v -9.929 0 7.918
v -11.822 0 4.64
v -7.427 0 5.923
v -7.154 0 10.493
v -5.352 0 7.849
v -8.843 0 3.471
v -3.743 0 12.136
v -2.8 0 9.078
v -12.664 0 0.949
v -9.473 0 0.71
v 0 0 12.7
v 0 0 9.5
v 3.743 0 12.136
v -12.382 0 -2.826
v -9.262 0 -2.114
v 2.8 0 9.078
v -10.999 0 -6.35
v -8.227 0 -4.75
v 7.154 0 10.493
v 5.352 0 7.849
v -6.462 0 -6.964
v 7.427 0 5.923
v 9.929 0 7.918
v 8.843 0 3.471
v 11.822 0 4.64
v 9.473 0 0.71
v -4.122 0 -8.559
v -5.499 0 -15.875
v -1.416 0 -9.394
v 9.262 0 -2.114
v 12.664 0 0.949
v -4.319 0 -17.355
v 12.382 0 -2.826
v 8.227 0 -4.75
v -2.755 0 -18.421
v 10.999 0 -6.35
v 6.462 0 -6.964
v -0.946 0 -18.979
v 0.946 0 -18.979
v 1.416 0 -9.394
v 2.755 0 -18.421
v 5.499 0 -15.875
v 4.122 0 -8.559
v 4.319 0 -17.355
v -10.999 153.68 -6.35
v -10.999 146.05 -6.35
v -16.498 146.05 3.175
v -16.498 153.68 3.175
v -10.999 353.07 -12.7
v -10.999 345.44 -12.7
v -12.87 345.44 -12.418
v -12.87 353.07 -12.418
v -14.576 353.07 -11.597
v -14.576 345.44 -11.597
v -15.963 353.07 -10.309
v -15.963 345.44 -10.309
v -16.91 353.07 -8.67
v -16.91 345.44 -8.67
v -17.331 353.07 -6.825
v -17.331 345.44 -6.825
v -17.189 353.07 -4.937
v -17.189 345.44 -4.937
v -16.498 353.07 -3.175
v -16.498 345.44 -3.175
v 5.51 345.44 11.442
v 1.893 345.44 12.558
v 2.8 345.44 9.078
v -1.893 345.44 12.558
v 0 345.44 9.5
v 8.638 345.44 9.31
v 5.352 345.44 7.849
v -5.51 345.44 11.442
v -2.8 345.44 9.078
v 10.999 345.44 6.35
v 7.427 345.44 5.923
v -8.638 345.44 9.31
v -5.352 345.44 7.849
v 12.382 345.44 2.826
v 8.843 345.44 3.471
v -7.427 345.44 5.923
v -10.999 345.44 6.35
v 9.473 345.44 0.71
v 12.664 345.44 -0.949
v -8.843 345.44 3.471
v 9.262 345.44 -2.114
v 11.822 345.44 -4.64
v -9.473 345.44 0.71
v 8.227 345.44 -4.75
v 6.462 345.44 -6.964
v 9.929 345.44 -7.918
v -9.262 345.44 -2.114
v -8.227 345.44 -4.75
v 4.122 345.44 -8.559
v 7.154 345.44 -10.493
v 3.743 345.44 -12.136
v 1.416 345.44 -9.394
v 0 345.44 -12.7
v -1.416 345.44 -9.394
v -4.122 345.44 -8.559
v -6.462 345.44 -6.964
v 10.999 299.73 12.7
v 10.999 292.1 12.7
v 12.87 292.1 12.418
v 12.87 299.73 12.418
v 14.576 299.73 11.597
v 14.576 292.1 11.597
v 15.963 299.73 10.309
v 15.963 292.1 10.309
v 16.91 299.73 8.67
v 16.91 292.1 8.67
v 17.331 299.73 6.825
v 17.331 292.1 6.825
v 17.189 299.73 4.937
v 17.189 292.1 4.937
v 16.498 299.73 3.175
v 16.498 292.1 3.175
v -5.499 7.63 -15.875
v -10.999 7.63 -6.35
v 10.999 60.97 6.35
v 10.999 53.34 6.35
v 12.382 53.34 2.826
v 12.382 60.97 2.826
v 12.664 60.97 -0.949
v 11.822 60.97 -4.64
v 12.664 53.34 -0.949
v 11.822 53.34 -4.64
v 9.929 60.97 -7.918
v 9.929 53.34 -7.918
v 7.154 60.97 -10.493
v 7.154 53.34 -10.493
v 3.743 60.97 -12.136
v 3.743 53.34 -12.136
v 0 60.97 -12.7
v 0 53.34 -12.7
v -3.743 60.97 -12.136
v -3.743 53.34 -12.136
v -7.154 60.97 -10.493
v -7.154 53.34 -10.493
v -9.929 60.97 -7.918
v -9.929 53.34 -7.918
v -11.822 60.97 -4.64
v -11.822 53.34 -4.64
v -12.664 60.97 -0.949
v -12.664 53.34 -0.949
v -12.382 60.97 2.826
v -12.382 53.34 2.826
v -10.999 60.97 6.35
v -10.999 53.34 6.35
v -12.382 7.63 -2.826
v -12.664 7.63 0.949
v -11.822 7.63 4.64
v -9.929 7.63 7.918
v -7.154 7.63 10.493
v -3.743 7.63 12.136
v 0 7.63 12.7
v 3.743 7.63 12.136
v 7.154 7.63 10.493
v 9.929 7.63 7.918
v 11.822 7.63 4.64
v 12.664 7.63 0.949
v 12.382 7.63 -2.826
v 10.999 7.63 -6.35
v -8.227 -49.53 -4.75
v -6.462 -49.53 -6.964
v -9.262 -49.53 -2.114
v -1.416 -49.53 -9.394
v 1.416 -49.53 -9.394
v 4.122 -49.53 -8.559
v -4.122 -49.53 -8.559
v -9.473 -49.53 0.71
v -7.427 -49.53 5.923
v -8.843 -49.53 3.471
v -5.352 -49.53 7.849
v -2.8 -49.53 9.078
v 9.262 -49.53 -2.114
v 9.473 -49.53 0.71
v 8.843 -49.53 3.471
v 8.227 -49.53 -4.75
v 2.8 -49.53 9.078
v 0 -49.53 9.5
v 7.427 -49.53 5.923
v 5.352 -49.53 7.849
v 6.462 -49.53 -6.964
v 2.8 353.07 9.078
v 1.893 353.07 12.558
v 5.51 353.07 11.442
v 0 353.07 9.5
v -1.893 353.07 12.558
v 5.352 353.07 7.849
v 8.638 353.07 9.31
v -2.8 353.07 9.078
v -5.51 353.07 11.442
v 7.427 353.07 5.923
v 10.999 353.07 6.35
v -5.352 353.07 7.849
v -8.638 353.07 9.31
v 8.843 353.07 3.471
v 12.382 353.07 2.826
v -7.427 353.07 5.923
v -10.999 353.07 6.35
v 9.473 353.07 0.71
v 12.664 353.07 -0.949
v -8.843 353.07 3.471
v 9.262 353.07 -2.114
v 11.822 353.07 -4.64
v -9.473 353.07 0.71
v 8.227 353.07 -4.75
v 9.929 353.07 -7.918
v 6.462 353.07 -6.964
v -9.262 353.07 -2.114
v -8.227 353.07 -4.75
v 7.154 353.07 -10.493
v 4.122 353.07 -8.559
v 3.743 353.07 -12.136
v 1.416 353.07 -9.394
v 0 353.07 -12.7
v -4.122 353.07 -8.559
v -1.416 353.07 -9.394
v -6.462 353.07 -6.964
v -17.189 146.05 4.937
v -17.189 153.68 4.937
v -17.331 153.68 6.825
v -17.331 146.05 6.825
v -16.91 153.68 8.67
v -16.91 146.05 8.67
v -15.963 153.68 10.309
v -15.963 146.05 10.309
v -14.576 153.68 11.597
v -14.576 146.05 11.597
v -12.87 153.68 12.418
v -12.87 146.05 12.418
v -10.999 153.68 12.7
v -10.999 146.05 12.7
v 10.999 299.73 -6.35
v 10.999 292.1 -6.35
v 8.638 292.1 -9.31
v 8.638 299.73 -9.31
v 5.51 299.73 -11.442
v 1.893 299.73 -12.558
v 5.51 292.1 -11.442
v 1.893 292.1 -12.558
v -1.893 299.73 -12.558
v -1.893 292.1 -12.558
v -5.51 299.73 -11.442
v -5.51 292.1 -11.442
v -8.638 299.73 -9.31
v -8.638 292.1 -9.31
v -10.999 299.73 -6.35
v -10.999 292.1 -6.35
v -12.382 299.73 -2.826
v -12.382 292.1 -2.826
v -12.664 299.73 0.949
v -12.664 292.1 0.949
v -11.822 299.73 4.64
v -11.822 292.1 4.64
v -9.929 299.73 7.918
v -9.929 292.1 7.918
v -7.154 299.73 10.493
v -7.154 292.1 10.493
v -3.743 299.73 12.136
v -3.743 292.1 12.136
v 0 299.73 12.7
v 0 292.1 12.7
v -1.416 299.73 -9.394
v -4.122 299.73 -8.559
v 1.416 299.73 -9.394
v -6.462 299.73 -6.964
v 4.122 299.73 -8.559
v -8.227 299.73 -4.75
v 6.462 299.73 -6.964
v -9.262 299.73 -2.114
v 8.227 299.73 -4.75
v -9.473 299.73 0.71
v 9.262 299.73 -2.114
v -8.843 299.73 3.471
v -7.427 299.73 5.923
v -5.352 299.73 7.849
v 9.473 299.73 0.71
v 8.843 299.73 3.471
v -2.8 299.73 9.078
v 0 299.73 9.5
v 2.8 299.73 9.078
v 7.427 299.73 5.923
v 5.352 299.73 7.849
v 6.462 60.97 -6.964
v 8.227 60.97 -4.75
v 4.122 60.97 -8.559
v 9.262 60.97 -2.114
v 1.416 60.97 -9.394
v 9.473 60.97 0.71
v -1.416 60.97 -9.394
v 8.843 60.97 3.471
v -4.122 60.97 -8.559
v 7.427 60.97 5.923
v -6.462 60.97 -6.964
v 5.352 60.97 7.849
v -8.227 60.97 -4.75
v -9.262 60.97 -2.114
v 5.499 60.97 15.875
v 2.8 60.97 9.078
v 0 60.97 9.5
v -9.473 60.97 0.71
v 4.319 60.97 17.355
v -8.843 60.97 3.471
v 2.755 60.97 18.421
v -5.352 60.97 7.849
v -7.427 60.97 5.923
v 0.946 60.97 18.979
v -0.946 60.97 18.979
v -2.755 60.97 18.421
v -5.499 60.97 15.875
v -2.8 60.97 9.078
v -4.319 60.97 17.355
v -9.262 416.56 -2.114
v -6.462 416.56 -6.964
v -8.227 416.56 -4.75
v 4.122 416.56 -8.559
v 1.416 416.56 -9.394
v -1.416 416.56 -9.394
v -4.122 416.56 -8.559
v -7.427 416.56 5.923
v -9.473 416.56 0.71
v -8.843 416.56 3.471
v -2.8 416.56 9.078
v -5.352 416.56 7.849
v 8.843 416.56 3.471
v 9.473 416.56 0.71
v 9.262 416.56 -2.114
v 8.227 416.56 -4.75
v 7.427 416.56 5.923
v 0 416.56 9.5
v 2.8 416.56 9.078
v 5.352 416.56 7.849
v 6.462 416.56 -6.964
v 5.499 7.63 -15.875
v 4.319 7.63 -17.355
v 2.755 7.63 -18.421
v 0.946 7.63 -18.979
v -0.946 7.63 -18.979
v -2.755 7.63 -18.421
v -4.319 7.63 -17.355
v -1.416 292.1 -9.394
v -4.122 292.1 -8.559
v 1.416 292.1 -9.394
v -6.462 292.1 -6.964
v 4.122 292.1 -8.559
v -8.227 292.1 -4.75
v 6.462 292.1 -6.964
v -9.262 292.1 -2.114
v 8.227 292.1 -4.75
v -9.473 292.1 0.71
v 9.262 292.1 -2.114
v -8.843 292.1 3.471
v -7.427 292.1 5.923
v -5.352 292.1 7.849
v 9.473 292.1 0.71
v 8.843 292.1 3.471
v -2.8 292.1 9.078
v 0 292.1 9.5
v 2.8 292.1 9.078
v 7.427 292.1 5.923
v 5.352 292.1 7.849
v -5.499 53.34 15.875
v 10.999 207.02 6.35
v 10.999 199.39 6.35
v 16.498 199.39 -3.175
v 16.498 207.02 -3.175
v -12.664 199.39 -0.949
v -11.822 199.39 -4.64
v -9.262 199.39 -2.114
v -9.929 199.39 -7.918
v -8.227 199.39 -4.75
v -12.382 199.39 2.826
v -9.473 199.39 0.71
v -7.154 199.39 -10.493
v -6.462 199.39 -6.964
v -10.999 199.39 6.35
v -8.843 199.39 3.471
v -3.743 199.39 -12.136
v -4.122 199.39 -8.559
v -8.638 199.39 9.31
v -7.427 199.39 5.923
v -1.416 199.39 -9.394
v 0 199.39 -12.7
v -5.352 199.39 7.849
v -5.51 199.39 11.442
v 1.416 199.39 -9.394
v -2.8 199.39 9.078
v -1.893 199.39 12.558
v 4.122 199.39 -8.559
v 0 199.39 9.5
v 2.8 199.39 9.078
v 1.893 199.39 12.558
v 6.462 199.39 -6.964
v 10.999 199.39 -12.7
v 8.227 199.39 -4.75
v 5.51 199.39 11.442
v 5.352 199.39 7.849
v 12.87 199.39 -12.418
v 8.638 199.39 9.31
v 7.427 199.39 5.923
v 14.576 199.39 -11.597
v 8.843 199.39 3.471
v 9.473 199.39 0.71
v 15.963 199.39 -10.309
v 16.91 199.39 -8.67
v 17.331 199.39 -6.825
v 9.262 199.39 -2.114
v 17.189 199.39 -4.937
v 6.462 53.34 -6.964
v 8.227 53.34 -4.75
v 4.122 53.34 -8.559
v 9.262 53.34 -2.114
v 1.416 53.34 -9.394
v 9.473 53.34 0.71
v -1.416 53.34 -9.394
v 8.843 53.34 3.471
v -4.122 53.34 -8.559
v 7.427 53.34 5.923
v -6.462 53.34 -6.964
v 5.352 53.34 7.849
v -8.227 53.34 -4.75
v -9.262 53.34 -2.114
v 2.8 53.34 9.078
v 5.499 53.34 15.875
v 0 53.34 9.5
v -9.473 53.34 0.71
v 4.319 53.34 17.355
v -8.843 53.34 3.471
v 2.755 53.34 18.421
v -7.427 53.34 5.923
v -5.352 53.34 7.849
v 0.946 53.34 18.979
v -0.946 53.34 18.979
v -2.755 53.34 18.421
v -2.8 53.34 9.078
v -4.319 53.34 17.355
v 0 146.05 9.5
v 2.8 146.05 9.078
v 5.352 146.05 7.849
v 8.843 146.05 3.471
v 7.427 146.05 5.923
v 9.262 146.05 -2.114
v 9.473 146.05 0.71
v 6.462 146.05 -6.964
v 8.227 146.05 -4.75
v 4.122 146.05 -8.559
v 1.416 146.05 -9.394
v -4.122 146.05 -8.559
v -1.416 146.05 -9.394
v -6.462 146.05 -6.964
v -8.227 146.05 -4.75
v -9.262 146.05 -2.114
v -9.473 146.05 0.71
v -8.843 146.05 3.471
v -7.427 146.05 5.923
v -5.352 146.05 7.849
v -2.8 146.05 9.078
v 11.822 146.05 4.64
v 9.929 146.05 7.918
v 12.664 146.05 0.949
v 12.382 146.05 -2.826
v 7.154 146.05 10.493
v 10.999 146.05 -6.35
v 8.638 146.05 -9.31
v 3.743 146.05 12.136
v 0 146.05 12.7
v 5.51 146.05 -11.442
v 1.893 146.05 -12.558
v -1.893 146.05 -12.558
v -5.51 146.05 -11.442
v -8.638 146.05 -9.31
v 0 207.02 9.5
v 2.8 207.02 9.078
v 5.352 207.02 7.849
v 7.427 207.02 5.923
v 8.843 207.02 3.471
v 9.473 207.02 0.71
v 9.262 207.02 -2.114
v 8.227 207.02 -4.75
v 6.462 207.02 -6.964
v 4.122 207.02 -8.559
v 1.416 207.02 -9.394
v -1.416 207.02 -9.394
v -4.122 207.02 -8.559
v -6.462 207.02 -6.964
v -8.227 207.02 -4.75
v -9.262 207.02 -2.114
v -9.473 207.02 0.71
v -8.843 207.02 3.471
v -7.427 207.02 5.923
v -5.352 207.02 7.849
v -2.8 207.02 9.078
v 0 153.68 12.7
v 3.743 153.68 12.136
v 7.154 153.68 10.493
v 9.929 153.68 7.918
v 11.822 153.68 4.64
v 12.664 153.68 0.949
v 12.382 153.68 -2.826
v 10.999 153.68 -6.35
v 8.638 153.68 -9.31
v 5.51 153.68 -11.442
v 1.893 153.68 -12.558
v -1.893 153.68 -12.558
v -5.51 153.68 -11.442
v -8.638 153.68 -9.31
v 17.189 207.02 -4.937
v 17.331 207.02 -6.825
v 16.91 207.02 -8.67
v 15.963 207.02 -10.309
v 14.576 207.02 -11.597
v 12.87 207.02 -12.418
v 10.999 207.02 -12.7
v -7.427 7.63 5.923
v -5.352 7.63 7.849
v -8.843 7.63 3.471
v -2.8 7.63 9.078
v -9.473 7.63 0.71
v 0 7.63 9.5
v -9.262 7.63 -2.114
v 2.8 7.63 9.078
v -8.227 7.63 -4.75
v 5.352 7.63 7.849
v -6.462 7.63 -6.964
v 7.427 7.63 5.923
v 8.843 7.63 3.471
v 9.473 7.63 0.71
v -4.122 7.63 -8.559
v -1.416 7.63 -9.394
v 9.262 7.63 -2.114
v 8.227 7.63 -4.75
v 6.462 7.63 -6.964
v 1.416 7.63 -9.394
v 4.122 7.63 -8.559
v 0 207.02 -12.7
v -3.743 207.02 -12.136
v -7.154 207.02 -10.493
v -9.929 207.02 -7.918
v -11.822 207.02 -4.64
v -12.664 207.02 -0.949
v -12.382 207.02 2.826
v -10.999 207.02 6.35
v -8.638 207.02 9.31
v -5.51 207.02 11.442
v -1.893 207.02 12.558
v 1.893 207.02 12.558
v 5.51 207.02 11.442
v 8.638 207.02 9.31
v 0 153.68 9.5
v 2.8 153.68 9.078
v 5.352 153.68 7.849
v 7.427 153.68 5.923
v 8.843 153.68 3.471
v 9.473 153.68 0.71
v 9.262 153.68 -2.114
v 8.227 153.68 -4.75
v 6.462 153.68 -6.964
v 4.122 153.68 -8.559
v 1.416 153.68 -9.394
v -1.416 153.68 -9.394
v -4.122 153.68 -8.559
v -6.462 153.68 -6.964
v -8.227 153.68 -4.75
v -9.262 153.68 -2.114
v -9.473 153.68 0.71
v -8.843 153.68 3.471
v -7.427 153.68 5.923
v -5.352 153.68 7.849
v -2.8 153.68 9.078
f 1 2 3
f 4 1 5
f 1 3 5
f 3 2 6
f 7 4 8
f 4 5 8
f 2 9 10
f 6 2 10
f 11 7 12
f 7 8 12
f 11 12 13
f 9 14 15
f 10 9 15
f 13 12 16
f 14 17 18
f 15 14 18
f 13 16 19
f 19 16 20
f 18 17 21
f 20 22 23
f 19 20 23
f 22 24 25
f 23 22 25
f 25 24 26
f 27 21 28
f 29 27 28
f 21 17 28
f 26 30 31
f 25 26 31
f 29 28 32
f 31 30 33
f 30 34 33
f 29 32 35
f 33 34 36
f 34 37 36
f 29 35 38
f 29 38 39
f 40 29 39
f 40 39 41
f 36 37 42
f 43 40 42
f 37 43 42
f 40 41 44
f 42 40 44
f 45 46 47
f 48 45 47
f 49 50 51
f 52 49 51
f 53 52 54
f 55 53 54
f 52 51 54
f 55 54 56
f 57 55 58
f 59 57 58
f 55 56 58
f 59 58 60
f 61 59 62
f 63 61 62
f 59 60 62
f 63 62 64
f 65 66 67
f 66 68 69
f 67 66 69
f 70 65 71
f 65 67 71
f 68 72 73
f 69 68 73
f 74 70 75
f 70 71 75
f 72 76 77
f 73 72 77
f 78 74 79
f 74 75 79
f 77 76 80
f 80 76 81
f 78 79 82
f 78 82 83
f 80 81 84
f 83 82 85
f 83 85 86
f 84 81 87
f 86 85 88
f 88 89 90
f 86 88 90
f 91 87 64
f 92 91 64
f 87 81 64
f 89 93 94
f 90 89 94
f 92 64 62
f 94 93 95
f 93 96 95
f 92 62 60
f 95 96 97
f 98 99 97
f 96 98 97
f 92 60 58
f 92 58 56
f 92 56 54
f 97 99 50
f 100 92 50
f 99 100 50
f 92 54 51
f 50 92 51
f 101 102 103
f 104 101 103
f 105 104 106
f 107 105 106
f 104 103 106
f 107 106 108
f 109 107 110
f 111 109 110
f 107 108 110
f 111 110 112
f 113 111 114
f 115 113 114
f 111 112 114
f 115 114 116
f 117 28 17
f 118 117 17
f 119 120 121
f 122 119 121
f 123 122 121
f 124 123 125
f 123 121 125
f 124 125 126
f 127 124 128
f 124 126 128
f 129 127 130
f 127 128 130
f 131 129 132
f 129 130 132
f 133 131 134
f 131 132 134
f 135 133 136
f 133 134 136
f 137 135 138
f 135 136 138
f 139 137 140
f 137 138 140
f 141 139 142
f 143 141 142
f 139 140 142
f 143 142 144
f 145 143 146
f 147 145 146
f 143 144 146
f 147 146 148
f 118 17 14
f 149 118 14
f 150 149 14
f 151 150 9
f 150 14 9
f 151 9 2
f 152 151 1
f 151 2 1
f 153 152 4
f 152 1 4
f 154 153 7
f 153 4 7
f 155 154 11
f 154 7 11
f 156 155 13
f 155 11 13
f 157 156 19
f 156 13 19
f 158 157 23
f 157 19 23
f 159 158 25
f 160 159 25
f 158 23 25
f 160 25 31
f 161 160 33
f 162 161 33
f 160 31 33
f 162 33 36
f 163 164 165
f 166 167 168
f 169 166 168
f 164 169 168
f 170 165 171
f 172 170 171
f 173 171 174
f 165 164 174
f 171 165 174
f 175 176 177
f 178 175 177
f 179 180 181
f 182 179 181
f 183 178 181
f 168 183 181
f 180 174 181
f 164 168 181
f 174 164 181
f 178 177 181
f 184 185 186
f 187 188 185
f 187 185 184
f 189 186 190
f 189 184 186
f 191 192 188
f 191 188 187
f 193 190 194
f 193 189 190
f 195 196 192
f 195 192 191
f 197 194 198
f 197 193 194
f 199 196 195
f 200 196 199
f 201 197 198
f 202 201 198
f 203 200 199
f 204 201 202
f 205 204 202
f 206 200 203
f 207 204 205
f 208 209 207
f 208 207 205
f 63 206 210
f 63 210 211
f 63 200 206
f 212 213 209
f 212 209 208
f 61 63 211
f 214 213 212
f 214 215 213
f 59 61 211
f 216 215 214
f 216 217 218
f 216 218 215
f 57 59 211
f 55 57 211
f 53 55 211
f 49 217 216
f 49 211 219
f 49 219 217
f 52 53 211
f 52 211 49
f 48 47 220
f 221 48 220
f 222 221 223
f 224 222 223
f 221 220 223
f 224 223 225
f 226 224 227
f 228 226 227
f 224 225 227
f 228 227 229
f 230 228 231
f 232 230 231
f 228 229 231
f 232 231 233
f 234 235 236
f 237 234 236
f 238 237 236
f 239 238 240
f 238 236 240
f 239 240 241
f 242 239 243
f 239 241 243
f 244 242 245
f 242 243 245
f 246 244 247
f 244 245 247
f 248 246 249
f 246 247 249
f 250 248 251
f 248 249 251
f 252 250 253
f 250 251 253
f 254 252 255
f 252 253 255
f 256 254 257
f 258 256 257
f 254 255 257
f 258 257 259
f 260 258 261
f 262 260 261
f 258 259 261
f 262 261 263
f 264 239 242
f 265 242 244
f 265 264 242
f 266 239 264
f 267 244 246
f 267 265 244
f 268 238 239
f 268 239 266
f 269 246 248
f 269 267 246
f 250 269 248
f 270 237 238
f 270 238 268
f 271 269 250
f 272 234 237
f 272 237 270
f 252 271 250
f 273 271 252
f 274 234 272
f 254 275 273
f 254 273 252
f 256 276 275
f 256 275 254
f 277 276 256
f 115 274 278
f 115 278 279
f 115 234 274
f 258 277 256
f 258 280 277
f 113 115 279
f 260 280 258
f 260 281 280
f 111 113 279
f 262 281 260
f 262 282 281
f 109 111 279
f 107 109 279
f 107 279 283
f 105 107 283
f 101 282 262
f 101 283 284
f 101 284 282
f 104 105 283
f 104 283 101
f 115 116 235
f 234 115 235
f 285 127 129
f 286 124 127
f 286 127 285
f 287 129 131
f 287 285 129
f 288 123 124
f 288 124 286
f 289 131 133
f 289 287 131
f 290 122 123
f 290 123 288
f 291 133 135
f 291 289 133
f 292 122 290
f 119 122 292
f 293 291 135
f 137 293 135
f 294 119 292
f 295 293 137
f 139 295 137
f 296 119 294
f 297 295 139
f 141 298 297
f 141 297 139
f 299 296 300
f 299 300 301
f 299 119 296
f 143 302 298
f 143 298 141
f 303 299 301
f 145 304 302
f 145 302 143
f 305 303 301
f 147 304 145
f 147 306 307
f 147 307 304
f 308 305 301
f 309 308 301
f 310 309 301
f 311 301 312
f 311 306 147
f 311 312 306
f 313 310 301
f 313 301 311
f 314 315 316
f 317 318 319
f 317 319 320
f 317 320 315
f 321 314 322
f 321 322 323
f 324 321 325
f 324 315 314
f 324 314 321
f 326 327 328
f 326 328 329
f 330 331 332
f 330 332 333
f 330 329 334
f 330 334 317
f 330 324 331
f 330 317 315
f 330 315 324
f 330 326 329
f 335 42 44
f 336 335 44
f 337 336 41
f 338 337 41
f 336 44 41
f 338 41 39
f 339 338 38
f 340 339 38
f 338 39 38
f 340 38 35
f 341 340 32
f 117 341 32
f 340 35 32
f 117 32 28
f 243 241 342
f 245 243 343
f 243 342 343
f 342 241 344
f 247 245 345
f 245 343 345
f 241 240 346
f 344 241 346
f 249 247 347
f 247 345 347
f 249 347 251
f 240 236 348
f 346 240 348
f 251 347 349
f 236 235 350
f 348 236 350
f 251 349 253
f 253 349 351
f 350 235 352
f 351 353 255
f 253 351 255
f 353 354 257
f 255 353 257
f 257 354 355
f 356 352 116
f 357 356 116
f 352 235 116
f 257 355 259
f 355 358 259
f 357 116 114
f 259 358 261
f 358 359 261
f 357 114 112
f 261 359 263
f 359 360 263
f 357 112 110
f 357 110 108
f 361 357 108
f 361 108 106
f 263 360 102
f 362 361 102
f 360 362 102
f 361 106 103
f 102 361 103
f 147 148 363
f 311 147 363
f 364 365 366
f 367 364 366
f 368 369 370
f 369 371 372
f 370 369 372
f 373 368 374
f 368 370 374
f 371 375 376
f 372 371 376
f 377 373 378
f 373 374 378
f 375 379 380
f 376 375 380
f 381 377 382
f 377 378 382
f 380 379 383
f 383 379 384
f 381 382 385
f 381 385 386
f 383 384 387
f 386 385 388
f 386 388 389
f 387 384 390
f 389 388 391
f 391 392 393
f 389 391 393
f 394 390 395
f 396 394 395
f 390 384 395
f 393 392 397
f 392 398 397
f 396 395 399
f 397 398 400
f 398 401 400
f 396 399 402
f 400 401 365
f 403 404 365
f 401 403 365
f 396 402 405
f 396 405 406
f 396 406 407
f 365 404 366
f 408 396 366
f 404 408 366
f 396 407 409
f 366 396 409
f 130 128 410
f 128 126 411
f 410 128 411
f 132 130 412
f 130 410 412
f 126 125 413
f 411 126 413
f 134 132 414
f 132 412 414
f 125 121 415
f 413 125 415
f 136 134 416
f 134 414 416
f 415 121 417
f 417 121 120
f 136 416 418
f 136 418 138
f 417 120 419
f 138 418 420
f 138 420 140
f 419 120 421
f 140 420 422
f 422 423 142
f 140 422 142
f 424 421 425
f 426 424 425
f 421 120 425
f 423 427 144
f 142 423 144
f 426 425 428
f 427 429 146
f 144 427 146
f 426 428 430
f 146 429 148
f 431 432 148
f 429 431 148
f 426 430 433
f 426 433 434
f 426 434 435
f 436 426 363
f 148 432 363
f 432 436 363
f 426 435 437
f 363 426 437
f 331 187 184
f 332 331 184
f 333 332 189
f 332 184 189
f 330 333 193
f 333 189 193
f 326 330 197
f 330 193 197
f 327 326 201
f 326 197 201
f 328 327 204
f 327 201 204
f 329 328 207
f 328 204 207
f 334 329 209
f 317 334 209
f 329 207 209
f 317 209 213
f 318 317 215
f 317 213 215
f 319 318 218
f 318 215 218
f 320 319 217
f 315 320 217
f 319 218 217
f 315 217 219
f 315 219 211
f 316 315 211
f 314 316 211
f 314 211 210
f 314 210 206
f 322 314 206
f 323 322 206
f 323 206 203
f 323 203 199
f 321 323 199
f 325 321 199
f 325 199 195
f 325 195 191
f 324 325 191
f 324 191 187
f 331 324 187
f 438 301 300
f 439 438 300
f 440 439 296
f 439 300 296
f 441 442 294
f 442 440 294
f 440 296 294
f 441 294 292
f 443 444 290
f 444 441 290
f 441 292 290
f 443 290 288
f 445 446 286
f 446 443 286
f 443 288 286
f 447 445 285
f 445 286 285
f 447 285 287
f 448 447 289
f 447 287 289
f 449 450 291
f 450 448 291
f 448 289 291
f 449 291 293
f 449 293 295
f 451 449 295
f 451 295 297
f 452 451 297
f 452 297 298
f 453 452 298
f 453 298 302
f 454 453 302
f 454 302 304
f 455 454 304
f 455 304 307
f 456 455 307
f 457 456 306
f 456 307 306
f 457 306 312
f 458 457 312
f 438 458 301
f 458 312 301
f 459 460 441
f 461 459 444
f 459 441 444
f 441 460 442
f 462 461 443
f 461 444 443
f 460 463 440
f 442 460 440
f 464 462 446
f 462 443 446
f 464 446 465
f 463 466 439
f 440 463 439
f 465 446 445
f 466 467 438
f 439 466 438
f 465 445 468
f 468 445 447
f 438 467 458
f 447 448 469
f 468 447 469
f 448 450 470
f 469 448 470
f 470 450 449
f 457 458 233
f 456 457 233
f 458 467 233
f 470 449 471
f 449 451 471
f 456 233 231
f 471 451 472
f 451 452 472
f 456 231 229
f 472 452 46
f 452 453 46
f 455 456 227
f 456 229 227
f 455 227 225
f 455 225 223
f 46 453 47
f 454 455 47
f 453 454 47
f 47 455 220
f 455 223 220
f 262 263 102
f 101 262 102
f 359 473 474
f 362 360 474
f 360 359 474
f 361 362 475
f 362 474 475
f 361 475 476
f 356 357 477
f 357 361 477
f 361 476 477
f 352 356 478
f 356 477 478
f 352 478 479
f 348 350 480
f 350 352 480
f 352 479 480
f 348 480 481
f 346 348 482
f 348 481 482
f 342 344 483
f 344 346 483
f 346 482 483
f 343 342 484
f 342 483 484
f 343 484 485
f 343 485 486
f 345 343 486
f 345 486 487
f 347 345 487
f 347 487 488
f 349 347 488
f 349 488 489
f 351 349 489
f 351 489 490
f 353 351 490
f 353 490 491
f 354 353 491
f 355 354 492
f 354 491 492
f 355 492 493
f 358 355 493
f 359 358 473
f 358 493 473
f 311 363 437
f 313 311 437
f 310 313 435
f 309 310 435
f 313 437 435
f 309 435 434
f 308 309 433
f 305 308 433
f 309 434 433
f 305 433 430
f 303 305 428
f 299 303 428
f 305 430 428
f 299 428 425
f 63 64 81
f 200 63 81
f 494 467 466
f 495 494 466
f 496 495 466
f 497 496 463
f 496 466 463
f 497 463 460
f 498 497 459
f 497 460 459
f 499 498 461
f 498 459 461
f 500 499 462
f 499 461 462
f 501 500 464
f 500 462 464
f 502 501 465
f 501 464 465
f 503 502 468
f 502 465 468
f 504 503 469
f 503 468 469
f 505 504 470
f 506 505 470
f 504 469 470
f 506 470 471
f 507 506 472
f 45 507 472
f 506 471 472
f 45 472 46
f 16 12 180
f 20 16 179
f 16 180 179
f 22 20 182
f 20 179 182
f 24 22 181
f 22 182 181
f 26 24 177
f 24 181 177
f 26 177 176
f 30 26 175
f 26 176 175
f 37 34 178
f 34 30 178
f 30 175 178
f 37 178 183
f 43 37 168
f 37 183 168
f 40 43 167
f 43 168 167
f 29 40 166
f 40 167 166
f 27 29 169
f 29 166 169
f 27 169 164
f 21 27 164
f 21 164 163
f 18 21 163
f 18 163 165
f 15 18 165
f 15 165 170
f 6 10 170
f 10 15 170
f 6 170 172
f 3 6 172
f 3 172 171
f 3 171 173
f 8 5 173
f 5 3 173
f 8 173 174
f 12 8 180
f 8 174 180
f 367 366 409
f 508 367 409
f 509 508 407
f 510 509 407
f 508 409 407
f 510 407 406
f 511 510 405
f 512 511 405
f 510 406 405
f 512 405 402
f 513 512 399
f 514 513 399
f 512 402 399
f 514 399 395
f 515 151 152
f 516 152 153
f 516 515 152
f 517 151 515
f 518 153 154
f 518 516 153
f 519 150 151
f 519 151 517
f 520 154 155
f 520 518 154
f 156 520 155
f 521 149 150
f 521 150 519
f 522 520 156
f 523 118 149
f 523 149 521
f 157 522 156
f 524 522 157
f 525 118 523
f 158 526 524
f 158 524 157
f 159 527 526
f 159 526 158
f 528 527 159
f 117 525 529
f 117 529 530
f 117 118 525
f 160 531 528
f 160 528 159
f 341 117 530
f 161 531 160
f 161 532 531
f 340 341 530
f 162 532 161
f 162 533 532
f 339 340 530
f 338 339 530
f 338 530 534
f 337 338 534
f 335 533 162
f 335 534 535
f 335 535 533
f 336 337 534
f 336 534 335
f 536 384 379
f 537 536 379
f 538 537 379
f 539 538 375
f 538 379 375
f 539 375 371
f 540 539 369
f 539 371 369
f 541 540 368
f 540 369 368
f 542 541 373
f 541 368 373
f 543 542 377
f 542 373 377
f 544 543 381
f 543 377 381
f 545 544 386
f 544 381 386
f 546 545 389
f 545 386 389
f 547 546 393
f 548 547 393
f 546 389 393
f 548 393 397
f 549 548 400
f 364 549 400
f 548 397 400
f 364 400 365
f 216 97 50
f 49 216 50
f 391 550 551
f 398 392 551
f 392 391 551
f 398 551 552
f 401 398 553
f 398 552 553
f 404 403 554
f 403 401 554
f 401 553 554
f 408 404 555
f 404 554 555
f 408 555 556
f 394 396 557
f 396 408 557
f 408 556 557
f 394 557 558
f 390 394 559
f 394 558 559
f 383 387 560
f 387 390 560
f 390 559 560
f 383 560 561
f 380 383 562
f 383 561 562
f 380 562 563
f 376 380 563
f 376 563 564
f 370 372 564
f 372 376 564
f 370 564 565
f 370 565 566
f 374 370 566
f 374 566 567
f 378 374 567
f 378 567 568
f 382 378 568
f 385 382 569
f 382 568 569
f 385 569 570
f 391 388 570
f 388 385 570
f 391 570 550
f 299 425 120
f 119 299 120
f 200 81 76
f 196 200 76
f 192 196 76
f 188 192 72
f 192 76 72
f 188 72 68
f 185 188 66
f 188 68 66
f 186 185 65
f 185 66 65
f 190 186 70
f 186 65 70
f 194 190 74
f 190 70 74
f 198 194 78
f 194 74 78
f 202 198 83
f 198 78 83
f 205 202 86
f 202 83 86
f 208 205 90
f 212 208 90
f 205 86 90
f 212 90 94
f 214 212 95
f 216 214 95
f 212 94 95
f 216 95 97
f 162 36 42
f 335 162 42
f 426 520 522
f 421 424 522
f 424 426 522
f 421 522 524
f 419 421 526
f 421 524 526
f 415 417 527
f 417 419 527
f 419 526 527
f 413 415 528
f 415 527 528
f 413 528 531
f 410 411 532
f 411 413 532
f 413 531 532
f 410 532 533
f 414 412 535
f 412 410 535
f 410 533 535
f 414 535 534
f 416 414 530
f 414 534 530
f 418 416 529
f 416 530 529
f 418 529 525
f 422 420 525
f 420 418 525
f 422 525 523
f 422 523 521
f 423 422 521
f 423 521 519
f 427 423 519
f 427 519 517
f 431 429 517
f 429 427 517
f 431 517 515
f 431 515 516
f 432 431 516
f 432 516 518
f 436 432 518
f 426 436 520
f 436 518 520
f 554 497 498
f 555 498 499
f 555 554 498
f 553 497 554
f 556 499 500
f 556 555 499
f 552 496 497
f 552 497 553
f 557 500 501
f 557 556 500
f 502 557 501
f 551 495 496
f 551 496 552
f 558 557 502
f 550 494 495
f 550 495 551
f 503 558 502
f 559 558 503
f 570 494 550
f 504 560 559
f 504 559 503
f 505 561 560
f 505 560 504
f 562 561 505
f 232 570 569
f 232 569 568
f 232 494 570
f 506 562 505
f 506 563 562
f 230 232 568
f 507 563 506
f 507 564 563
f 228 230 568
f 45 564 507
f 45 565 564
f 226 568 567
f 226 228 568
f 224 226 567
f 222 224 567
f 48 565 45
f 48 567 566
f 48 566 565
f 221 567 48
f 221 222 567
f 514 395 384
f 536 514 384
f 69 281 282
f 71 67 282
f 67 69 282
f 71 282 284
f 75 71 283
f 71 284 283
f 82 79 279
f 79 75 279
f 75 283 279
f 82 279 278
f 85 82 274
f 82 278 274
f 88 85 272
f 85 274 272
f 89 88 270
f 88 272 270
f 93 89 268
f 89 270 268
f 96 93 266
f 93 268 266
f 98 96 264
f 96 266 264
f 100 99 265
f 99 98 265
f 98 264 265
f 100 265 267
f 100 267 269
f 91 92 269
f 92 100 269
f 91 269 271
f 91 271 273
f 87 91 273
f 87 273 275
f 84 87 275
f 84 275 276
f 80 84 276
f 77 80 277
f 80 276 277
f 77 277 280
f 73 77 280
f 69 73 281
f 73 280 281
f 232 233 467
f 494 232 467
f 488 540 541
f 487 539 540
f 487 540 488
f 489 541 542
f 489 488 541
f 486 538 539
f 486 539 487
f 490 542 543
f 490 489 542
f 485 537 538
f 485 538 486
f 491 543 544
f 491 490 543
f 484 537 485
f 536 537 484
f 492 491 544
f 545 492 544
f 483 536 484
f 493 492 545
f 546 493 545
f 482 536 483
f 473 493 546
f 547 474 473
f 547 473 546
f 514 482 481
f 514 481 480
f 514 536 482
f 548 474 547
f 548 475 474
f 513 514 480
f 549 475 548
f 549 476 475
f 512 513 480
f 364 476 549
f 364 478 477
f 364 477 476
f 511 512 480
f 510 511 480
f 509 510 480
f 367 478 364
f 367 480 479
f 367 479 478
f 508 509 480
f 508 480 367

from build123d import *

# Parameters (mm, degrees)
BOSS_EXTRUDE1_DEPTH   = 7.63
LPATTERN2_COUNT       = 2
LPATTERN2_PITCH       = 53.34
BODY_MOVE_COPY1_ANGLE = 180
LPATTERN3_COUNT       = 3
LPATTERN3_PITCH       = 146.05
BODY_MOVE_COPY2_ANGLE = 120
BODY_MOVE_COPY3_ANGLE = 120
BOSS_EXTRUDE2_START   = -49.53
SKETCH3_R             = 9.5
BOSS_EXTRUDE2_DEPTH   = 466.09


with BuildPart() as part:
    # Sketch1 → Boss-Extrude1 (new body)
    with BuildSketch(Plane(origin=(0, 0, 0), x_dir=(1, 0, 0), z_dir=(0, 1, 0))):
        with BuildLine():
            Line((-5.499261314, 15.875), (-10.998522628, 6.35))
            ThreePointArc((-10.998522628, 6.35), (0, -12.7), (10.998522628, 6.35))
            Line((10.998522628, 6.35), (5.499261314, 15.875))
            ThreePointArc((5.499261314, 15.875), (0, 19.05), (-5.499261314, 15.875))
        make_face()
    extrude(amount=BOSS_EXTRUDE1_DEPTH)


with BuildPart() as lpattern2_1:
    # LPattern2: pattern copy
    add(part.part.moved(Location(Vector(0, 1, 0) * (1 * LPATTERN2_PITCH))))


with BuildPart() as lpattern2_1_1:
    # Body-Move/Copy1: moved
    add(lpattern2_1.part.rotate(Axis((0, 0, 0), (0, 1, 0)), BODY_MOVE_COPY1_ANGLE))


with BuildPart() as lpattern3_1:
    # LPattern3: pattern copy
    add(part.part.moved(Location(Vector(0, 1, 0) * (1 * LPATTERN3_PITCH))))


with BuildPart() as lpattern3_2:
    # LPattern3: pattern copy
    add(part.part.moved(Location(Vector(0, 1, 0) * (2 * LPATTERN3_PITCH))))


with BuildPart() as lpattern3_3:
    # LPattern3: pattern copy
    add(lpattern2_1_1.part.moved(Location(Vector(0, 1, 0) * (1 * LPATTERN3_PITCH))))


with BuildPart() as lpattern3_4:
    # LPattern3: pattern copy
    add(lpattern2_1_1.part.moved(Location(Vector(0, 1, 0) * (2 * LPATTERN3_PITCH))))


with BuildPart() as lpattern3_1_1:
    # Body-Move/Copy2: moved
    add(lpattern3_1.part.rotate(Axis((0, 0, 0), (0, 1, 0)), BODY_MOVE_COPY2_ANGLE))


with BuildPart() as lpattern3_3_1:
    # Body-Move/Copy2: moved
    add(lpattern3_3.part.rotate(Axis((0, 0, 0), (0, 1, 0)), BODY_MOVE_COPY2_ANGLE))


with BuildPart() as lpattern3_2_1:
    # Body-Move/Copy3: moved
    add(lpattern3_2.part.rotate(Axis((0, 0, 0), (0, -1, 0)), BODY_MOVE_COPY3_ANGLE))


with BuildPart() as lpattern3_4_1:
    # Body-Move/Copy3: moved
    add(lpattern3_4.part.rotate(Axis((0, 0, 0), (0, -1, 0)), BODY_MOVE_COPY3_ANGLE))


with BuildPart() as part_1:
    add(part.part)

    add(lpattern2_1_1.part)  # Boss-Extrude2 merges LPattern2_1

    add(lpattern3_1_1.part)  # Boss-Extrude2 merges LPattern3_1

    add(lpattern3_2_1.part)  # Boss-Extrude2 merges LPattern3_2

    add(lpattern3_3_1.part)  # Boss-Extrude2 merges LPattern3_3

    add(lpattern3_4_1.part)  # Boss-Extrude2 merges LPattern3_4
    # Sketch3 → Boss-Extrude2 (add)
    with BuildSketch(Plane(origin=(0, 0, 0), x_dir=(1, 0, 0), z_dir=(0, 1, 0)).offset(BOSS_EXTRUDE2_START)):
        Circle(SKETCH3_R)
    extrude(amount=BOSS_EXTRUDE2_DEPTH)


solid = part_1.part
